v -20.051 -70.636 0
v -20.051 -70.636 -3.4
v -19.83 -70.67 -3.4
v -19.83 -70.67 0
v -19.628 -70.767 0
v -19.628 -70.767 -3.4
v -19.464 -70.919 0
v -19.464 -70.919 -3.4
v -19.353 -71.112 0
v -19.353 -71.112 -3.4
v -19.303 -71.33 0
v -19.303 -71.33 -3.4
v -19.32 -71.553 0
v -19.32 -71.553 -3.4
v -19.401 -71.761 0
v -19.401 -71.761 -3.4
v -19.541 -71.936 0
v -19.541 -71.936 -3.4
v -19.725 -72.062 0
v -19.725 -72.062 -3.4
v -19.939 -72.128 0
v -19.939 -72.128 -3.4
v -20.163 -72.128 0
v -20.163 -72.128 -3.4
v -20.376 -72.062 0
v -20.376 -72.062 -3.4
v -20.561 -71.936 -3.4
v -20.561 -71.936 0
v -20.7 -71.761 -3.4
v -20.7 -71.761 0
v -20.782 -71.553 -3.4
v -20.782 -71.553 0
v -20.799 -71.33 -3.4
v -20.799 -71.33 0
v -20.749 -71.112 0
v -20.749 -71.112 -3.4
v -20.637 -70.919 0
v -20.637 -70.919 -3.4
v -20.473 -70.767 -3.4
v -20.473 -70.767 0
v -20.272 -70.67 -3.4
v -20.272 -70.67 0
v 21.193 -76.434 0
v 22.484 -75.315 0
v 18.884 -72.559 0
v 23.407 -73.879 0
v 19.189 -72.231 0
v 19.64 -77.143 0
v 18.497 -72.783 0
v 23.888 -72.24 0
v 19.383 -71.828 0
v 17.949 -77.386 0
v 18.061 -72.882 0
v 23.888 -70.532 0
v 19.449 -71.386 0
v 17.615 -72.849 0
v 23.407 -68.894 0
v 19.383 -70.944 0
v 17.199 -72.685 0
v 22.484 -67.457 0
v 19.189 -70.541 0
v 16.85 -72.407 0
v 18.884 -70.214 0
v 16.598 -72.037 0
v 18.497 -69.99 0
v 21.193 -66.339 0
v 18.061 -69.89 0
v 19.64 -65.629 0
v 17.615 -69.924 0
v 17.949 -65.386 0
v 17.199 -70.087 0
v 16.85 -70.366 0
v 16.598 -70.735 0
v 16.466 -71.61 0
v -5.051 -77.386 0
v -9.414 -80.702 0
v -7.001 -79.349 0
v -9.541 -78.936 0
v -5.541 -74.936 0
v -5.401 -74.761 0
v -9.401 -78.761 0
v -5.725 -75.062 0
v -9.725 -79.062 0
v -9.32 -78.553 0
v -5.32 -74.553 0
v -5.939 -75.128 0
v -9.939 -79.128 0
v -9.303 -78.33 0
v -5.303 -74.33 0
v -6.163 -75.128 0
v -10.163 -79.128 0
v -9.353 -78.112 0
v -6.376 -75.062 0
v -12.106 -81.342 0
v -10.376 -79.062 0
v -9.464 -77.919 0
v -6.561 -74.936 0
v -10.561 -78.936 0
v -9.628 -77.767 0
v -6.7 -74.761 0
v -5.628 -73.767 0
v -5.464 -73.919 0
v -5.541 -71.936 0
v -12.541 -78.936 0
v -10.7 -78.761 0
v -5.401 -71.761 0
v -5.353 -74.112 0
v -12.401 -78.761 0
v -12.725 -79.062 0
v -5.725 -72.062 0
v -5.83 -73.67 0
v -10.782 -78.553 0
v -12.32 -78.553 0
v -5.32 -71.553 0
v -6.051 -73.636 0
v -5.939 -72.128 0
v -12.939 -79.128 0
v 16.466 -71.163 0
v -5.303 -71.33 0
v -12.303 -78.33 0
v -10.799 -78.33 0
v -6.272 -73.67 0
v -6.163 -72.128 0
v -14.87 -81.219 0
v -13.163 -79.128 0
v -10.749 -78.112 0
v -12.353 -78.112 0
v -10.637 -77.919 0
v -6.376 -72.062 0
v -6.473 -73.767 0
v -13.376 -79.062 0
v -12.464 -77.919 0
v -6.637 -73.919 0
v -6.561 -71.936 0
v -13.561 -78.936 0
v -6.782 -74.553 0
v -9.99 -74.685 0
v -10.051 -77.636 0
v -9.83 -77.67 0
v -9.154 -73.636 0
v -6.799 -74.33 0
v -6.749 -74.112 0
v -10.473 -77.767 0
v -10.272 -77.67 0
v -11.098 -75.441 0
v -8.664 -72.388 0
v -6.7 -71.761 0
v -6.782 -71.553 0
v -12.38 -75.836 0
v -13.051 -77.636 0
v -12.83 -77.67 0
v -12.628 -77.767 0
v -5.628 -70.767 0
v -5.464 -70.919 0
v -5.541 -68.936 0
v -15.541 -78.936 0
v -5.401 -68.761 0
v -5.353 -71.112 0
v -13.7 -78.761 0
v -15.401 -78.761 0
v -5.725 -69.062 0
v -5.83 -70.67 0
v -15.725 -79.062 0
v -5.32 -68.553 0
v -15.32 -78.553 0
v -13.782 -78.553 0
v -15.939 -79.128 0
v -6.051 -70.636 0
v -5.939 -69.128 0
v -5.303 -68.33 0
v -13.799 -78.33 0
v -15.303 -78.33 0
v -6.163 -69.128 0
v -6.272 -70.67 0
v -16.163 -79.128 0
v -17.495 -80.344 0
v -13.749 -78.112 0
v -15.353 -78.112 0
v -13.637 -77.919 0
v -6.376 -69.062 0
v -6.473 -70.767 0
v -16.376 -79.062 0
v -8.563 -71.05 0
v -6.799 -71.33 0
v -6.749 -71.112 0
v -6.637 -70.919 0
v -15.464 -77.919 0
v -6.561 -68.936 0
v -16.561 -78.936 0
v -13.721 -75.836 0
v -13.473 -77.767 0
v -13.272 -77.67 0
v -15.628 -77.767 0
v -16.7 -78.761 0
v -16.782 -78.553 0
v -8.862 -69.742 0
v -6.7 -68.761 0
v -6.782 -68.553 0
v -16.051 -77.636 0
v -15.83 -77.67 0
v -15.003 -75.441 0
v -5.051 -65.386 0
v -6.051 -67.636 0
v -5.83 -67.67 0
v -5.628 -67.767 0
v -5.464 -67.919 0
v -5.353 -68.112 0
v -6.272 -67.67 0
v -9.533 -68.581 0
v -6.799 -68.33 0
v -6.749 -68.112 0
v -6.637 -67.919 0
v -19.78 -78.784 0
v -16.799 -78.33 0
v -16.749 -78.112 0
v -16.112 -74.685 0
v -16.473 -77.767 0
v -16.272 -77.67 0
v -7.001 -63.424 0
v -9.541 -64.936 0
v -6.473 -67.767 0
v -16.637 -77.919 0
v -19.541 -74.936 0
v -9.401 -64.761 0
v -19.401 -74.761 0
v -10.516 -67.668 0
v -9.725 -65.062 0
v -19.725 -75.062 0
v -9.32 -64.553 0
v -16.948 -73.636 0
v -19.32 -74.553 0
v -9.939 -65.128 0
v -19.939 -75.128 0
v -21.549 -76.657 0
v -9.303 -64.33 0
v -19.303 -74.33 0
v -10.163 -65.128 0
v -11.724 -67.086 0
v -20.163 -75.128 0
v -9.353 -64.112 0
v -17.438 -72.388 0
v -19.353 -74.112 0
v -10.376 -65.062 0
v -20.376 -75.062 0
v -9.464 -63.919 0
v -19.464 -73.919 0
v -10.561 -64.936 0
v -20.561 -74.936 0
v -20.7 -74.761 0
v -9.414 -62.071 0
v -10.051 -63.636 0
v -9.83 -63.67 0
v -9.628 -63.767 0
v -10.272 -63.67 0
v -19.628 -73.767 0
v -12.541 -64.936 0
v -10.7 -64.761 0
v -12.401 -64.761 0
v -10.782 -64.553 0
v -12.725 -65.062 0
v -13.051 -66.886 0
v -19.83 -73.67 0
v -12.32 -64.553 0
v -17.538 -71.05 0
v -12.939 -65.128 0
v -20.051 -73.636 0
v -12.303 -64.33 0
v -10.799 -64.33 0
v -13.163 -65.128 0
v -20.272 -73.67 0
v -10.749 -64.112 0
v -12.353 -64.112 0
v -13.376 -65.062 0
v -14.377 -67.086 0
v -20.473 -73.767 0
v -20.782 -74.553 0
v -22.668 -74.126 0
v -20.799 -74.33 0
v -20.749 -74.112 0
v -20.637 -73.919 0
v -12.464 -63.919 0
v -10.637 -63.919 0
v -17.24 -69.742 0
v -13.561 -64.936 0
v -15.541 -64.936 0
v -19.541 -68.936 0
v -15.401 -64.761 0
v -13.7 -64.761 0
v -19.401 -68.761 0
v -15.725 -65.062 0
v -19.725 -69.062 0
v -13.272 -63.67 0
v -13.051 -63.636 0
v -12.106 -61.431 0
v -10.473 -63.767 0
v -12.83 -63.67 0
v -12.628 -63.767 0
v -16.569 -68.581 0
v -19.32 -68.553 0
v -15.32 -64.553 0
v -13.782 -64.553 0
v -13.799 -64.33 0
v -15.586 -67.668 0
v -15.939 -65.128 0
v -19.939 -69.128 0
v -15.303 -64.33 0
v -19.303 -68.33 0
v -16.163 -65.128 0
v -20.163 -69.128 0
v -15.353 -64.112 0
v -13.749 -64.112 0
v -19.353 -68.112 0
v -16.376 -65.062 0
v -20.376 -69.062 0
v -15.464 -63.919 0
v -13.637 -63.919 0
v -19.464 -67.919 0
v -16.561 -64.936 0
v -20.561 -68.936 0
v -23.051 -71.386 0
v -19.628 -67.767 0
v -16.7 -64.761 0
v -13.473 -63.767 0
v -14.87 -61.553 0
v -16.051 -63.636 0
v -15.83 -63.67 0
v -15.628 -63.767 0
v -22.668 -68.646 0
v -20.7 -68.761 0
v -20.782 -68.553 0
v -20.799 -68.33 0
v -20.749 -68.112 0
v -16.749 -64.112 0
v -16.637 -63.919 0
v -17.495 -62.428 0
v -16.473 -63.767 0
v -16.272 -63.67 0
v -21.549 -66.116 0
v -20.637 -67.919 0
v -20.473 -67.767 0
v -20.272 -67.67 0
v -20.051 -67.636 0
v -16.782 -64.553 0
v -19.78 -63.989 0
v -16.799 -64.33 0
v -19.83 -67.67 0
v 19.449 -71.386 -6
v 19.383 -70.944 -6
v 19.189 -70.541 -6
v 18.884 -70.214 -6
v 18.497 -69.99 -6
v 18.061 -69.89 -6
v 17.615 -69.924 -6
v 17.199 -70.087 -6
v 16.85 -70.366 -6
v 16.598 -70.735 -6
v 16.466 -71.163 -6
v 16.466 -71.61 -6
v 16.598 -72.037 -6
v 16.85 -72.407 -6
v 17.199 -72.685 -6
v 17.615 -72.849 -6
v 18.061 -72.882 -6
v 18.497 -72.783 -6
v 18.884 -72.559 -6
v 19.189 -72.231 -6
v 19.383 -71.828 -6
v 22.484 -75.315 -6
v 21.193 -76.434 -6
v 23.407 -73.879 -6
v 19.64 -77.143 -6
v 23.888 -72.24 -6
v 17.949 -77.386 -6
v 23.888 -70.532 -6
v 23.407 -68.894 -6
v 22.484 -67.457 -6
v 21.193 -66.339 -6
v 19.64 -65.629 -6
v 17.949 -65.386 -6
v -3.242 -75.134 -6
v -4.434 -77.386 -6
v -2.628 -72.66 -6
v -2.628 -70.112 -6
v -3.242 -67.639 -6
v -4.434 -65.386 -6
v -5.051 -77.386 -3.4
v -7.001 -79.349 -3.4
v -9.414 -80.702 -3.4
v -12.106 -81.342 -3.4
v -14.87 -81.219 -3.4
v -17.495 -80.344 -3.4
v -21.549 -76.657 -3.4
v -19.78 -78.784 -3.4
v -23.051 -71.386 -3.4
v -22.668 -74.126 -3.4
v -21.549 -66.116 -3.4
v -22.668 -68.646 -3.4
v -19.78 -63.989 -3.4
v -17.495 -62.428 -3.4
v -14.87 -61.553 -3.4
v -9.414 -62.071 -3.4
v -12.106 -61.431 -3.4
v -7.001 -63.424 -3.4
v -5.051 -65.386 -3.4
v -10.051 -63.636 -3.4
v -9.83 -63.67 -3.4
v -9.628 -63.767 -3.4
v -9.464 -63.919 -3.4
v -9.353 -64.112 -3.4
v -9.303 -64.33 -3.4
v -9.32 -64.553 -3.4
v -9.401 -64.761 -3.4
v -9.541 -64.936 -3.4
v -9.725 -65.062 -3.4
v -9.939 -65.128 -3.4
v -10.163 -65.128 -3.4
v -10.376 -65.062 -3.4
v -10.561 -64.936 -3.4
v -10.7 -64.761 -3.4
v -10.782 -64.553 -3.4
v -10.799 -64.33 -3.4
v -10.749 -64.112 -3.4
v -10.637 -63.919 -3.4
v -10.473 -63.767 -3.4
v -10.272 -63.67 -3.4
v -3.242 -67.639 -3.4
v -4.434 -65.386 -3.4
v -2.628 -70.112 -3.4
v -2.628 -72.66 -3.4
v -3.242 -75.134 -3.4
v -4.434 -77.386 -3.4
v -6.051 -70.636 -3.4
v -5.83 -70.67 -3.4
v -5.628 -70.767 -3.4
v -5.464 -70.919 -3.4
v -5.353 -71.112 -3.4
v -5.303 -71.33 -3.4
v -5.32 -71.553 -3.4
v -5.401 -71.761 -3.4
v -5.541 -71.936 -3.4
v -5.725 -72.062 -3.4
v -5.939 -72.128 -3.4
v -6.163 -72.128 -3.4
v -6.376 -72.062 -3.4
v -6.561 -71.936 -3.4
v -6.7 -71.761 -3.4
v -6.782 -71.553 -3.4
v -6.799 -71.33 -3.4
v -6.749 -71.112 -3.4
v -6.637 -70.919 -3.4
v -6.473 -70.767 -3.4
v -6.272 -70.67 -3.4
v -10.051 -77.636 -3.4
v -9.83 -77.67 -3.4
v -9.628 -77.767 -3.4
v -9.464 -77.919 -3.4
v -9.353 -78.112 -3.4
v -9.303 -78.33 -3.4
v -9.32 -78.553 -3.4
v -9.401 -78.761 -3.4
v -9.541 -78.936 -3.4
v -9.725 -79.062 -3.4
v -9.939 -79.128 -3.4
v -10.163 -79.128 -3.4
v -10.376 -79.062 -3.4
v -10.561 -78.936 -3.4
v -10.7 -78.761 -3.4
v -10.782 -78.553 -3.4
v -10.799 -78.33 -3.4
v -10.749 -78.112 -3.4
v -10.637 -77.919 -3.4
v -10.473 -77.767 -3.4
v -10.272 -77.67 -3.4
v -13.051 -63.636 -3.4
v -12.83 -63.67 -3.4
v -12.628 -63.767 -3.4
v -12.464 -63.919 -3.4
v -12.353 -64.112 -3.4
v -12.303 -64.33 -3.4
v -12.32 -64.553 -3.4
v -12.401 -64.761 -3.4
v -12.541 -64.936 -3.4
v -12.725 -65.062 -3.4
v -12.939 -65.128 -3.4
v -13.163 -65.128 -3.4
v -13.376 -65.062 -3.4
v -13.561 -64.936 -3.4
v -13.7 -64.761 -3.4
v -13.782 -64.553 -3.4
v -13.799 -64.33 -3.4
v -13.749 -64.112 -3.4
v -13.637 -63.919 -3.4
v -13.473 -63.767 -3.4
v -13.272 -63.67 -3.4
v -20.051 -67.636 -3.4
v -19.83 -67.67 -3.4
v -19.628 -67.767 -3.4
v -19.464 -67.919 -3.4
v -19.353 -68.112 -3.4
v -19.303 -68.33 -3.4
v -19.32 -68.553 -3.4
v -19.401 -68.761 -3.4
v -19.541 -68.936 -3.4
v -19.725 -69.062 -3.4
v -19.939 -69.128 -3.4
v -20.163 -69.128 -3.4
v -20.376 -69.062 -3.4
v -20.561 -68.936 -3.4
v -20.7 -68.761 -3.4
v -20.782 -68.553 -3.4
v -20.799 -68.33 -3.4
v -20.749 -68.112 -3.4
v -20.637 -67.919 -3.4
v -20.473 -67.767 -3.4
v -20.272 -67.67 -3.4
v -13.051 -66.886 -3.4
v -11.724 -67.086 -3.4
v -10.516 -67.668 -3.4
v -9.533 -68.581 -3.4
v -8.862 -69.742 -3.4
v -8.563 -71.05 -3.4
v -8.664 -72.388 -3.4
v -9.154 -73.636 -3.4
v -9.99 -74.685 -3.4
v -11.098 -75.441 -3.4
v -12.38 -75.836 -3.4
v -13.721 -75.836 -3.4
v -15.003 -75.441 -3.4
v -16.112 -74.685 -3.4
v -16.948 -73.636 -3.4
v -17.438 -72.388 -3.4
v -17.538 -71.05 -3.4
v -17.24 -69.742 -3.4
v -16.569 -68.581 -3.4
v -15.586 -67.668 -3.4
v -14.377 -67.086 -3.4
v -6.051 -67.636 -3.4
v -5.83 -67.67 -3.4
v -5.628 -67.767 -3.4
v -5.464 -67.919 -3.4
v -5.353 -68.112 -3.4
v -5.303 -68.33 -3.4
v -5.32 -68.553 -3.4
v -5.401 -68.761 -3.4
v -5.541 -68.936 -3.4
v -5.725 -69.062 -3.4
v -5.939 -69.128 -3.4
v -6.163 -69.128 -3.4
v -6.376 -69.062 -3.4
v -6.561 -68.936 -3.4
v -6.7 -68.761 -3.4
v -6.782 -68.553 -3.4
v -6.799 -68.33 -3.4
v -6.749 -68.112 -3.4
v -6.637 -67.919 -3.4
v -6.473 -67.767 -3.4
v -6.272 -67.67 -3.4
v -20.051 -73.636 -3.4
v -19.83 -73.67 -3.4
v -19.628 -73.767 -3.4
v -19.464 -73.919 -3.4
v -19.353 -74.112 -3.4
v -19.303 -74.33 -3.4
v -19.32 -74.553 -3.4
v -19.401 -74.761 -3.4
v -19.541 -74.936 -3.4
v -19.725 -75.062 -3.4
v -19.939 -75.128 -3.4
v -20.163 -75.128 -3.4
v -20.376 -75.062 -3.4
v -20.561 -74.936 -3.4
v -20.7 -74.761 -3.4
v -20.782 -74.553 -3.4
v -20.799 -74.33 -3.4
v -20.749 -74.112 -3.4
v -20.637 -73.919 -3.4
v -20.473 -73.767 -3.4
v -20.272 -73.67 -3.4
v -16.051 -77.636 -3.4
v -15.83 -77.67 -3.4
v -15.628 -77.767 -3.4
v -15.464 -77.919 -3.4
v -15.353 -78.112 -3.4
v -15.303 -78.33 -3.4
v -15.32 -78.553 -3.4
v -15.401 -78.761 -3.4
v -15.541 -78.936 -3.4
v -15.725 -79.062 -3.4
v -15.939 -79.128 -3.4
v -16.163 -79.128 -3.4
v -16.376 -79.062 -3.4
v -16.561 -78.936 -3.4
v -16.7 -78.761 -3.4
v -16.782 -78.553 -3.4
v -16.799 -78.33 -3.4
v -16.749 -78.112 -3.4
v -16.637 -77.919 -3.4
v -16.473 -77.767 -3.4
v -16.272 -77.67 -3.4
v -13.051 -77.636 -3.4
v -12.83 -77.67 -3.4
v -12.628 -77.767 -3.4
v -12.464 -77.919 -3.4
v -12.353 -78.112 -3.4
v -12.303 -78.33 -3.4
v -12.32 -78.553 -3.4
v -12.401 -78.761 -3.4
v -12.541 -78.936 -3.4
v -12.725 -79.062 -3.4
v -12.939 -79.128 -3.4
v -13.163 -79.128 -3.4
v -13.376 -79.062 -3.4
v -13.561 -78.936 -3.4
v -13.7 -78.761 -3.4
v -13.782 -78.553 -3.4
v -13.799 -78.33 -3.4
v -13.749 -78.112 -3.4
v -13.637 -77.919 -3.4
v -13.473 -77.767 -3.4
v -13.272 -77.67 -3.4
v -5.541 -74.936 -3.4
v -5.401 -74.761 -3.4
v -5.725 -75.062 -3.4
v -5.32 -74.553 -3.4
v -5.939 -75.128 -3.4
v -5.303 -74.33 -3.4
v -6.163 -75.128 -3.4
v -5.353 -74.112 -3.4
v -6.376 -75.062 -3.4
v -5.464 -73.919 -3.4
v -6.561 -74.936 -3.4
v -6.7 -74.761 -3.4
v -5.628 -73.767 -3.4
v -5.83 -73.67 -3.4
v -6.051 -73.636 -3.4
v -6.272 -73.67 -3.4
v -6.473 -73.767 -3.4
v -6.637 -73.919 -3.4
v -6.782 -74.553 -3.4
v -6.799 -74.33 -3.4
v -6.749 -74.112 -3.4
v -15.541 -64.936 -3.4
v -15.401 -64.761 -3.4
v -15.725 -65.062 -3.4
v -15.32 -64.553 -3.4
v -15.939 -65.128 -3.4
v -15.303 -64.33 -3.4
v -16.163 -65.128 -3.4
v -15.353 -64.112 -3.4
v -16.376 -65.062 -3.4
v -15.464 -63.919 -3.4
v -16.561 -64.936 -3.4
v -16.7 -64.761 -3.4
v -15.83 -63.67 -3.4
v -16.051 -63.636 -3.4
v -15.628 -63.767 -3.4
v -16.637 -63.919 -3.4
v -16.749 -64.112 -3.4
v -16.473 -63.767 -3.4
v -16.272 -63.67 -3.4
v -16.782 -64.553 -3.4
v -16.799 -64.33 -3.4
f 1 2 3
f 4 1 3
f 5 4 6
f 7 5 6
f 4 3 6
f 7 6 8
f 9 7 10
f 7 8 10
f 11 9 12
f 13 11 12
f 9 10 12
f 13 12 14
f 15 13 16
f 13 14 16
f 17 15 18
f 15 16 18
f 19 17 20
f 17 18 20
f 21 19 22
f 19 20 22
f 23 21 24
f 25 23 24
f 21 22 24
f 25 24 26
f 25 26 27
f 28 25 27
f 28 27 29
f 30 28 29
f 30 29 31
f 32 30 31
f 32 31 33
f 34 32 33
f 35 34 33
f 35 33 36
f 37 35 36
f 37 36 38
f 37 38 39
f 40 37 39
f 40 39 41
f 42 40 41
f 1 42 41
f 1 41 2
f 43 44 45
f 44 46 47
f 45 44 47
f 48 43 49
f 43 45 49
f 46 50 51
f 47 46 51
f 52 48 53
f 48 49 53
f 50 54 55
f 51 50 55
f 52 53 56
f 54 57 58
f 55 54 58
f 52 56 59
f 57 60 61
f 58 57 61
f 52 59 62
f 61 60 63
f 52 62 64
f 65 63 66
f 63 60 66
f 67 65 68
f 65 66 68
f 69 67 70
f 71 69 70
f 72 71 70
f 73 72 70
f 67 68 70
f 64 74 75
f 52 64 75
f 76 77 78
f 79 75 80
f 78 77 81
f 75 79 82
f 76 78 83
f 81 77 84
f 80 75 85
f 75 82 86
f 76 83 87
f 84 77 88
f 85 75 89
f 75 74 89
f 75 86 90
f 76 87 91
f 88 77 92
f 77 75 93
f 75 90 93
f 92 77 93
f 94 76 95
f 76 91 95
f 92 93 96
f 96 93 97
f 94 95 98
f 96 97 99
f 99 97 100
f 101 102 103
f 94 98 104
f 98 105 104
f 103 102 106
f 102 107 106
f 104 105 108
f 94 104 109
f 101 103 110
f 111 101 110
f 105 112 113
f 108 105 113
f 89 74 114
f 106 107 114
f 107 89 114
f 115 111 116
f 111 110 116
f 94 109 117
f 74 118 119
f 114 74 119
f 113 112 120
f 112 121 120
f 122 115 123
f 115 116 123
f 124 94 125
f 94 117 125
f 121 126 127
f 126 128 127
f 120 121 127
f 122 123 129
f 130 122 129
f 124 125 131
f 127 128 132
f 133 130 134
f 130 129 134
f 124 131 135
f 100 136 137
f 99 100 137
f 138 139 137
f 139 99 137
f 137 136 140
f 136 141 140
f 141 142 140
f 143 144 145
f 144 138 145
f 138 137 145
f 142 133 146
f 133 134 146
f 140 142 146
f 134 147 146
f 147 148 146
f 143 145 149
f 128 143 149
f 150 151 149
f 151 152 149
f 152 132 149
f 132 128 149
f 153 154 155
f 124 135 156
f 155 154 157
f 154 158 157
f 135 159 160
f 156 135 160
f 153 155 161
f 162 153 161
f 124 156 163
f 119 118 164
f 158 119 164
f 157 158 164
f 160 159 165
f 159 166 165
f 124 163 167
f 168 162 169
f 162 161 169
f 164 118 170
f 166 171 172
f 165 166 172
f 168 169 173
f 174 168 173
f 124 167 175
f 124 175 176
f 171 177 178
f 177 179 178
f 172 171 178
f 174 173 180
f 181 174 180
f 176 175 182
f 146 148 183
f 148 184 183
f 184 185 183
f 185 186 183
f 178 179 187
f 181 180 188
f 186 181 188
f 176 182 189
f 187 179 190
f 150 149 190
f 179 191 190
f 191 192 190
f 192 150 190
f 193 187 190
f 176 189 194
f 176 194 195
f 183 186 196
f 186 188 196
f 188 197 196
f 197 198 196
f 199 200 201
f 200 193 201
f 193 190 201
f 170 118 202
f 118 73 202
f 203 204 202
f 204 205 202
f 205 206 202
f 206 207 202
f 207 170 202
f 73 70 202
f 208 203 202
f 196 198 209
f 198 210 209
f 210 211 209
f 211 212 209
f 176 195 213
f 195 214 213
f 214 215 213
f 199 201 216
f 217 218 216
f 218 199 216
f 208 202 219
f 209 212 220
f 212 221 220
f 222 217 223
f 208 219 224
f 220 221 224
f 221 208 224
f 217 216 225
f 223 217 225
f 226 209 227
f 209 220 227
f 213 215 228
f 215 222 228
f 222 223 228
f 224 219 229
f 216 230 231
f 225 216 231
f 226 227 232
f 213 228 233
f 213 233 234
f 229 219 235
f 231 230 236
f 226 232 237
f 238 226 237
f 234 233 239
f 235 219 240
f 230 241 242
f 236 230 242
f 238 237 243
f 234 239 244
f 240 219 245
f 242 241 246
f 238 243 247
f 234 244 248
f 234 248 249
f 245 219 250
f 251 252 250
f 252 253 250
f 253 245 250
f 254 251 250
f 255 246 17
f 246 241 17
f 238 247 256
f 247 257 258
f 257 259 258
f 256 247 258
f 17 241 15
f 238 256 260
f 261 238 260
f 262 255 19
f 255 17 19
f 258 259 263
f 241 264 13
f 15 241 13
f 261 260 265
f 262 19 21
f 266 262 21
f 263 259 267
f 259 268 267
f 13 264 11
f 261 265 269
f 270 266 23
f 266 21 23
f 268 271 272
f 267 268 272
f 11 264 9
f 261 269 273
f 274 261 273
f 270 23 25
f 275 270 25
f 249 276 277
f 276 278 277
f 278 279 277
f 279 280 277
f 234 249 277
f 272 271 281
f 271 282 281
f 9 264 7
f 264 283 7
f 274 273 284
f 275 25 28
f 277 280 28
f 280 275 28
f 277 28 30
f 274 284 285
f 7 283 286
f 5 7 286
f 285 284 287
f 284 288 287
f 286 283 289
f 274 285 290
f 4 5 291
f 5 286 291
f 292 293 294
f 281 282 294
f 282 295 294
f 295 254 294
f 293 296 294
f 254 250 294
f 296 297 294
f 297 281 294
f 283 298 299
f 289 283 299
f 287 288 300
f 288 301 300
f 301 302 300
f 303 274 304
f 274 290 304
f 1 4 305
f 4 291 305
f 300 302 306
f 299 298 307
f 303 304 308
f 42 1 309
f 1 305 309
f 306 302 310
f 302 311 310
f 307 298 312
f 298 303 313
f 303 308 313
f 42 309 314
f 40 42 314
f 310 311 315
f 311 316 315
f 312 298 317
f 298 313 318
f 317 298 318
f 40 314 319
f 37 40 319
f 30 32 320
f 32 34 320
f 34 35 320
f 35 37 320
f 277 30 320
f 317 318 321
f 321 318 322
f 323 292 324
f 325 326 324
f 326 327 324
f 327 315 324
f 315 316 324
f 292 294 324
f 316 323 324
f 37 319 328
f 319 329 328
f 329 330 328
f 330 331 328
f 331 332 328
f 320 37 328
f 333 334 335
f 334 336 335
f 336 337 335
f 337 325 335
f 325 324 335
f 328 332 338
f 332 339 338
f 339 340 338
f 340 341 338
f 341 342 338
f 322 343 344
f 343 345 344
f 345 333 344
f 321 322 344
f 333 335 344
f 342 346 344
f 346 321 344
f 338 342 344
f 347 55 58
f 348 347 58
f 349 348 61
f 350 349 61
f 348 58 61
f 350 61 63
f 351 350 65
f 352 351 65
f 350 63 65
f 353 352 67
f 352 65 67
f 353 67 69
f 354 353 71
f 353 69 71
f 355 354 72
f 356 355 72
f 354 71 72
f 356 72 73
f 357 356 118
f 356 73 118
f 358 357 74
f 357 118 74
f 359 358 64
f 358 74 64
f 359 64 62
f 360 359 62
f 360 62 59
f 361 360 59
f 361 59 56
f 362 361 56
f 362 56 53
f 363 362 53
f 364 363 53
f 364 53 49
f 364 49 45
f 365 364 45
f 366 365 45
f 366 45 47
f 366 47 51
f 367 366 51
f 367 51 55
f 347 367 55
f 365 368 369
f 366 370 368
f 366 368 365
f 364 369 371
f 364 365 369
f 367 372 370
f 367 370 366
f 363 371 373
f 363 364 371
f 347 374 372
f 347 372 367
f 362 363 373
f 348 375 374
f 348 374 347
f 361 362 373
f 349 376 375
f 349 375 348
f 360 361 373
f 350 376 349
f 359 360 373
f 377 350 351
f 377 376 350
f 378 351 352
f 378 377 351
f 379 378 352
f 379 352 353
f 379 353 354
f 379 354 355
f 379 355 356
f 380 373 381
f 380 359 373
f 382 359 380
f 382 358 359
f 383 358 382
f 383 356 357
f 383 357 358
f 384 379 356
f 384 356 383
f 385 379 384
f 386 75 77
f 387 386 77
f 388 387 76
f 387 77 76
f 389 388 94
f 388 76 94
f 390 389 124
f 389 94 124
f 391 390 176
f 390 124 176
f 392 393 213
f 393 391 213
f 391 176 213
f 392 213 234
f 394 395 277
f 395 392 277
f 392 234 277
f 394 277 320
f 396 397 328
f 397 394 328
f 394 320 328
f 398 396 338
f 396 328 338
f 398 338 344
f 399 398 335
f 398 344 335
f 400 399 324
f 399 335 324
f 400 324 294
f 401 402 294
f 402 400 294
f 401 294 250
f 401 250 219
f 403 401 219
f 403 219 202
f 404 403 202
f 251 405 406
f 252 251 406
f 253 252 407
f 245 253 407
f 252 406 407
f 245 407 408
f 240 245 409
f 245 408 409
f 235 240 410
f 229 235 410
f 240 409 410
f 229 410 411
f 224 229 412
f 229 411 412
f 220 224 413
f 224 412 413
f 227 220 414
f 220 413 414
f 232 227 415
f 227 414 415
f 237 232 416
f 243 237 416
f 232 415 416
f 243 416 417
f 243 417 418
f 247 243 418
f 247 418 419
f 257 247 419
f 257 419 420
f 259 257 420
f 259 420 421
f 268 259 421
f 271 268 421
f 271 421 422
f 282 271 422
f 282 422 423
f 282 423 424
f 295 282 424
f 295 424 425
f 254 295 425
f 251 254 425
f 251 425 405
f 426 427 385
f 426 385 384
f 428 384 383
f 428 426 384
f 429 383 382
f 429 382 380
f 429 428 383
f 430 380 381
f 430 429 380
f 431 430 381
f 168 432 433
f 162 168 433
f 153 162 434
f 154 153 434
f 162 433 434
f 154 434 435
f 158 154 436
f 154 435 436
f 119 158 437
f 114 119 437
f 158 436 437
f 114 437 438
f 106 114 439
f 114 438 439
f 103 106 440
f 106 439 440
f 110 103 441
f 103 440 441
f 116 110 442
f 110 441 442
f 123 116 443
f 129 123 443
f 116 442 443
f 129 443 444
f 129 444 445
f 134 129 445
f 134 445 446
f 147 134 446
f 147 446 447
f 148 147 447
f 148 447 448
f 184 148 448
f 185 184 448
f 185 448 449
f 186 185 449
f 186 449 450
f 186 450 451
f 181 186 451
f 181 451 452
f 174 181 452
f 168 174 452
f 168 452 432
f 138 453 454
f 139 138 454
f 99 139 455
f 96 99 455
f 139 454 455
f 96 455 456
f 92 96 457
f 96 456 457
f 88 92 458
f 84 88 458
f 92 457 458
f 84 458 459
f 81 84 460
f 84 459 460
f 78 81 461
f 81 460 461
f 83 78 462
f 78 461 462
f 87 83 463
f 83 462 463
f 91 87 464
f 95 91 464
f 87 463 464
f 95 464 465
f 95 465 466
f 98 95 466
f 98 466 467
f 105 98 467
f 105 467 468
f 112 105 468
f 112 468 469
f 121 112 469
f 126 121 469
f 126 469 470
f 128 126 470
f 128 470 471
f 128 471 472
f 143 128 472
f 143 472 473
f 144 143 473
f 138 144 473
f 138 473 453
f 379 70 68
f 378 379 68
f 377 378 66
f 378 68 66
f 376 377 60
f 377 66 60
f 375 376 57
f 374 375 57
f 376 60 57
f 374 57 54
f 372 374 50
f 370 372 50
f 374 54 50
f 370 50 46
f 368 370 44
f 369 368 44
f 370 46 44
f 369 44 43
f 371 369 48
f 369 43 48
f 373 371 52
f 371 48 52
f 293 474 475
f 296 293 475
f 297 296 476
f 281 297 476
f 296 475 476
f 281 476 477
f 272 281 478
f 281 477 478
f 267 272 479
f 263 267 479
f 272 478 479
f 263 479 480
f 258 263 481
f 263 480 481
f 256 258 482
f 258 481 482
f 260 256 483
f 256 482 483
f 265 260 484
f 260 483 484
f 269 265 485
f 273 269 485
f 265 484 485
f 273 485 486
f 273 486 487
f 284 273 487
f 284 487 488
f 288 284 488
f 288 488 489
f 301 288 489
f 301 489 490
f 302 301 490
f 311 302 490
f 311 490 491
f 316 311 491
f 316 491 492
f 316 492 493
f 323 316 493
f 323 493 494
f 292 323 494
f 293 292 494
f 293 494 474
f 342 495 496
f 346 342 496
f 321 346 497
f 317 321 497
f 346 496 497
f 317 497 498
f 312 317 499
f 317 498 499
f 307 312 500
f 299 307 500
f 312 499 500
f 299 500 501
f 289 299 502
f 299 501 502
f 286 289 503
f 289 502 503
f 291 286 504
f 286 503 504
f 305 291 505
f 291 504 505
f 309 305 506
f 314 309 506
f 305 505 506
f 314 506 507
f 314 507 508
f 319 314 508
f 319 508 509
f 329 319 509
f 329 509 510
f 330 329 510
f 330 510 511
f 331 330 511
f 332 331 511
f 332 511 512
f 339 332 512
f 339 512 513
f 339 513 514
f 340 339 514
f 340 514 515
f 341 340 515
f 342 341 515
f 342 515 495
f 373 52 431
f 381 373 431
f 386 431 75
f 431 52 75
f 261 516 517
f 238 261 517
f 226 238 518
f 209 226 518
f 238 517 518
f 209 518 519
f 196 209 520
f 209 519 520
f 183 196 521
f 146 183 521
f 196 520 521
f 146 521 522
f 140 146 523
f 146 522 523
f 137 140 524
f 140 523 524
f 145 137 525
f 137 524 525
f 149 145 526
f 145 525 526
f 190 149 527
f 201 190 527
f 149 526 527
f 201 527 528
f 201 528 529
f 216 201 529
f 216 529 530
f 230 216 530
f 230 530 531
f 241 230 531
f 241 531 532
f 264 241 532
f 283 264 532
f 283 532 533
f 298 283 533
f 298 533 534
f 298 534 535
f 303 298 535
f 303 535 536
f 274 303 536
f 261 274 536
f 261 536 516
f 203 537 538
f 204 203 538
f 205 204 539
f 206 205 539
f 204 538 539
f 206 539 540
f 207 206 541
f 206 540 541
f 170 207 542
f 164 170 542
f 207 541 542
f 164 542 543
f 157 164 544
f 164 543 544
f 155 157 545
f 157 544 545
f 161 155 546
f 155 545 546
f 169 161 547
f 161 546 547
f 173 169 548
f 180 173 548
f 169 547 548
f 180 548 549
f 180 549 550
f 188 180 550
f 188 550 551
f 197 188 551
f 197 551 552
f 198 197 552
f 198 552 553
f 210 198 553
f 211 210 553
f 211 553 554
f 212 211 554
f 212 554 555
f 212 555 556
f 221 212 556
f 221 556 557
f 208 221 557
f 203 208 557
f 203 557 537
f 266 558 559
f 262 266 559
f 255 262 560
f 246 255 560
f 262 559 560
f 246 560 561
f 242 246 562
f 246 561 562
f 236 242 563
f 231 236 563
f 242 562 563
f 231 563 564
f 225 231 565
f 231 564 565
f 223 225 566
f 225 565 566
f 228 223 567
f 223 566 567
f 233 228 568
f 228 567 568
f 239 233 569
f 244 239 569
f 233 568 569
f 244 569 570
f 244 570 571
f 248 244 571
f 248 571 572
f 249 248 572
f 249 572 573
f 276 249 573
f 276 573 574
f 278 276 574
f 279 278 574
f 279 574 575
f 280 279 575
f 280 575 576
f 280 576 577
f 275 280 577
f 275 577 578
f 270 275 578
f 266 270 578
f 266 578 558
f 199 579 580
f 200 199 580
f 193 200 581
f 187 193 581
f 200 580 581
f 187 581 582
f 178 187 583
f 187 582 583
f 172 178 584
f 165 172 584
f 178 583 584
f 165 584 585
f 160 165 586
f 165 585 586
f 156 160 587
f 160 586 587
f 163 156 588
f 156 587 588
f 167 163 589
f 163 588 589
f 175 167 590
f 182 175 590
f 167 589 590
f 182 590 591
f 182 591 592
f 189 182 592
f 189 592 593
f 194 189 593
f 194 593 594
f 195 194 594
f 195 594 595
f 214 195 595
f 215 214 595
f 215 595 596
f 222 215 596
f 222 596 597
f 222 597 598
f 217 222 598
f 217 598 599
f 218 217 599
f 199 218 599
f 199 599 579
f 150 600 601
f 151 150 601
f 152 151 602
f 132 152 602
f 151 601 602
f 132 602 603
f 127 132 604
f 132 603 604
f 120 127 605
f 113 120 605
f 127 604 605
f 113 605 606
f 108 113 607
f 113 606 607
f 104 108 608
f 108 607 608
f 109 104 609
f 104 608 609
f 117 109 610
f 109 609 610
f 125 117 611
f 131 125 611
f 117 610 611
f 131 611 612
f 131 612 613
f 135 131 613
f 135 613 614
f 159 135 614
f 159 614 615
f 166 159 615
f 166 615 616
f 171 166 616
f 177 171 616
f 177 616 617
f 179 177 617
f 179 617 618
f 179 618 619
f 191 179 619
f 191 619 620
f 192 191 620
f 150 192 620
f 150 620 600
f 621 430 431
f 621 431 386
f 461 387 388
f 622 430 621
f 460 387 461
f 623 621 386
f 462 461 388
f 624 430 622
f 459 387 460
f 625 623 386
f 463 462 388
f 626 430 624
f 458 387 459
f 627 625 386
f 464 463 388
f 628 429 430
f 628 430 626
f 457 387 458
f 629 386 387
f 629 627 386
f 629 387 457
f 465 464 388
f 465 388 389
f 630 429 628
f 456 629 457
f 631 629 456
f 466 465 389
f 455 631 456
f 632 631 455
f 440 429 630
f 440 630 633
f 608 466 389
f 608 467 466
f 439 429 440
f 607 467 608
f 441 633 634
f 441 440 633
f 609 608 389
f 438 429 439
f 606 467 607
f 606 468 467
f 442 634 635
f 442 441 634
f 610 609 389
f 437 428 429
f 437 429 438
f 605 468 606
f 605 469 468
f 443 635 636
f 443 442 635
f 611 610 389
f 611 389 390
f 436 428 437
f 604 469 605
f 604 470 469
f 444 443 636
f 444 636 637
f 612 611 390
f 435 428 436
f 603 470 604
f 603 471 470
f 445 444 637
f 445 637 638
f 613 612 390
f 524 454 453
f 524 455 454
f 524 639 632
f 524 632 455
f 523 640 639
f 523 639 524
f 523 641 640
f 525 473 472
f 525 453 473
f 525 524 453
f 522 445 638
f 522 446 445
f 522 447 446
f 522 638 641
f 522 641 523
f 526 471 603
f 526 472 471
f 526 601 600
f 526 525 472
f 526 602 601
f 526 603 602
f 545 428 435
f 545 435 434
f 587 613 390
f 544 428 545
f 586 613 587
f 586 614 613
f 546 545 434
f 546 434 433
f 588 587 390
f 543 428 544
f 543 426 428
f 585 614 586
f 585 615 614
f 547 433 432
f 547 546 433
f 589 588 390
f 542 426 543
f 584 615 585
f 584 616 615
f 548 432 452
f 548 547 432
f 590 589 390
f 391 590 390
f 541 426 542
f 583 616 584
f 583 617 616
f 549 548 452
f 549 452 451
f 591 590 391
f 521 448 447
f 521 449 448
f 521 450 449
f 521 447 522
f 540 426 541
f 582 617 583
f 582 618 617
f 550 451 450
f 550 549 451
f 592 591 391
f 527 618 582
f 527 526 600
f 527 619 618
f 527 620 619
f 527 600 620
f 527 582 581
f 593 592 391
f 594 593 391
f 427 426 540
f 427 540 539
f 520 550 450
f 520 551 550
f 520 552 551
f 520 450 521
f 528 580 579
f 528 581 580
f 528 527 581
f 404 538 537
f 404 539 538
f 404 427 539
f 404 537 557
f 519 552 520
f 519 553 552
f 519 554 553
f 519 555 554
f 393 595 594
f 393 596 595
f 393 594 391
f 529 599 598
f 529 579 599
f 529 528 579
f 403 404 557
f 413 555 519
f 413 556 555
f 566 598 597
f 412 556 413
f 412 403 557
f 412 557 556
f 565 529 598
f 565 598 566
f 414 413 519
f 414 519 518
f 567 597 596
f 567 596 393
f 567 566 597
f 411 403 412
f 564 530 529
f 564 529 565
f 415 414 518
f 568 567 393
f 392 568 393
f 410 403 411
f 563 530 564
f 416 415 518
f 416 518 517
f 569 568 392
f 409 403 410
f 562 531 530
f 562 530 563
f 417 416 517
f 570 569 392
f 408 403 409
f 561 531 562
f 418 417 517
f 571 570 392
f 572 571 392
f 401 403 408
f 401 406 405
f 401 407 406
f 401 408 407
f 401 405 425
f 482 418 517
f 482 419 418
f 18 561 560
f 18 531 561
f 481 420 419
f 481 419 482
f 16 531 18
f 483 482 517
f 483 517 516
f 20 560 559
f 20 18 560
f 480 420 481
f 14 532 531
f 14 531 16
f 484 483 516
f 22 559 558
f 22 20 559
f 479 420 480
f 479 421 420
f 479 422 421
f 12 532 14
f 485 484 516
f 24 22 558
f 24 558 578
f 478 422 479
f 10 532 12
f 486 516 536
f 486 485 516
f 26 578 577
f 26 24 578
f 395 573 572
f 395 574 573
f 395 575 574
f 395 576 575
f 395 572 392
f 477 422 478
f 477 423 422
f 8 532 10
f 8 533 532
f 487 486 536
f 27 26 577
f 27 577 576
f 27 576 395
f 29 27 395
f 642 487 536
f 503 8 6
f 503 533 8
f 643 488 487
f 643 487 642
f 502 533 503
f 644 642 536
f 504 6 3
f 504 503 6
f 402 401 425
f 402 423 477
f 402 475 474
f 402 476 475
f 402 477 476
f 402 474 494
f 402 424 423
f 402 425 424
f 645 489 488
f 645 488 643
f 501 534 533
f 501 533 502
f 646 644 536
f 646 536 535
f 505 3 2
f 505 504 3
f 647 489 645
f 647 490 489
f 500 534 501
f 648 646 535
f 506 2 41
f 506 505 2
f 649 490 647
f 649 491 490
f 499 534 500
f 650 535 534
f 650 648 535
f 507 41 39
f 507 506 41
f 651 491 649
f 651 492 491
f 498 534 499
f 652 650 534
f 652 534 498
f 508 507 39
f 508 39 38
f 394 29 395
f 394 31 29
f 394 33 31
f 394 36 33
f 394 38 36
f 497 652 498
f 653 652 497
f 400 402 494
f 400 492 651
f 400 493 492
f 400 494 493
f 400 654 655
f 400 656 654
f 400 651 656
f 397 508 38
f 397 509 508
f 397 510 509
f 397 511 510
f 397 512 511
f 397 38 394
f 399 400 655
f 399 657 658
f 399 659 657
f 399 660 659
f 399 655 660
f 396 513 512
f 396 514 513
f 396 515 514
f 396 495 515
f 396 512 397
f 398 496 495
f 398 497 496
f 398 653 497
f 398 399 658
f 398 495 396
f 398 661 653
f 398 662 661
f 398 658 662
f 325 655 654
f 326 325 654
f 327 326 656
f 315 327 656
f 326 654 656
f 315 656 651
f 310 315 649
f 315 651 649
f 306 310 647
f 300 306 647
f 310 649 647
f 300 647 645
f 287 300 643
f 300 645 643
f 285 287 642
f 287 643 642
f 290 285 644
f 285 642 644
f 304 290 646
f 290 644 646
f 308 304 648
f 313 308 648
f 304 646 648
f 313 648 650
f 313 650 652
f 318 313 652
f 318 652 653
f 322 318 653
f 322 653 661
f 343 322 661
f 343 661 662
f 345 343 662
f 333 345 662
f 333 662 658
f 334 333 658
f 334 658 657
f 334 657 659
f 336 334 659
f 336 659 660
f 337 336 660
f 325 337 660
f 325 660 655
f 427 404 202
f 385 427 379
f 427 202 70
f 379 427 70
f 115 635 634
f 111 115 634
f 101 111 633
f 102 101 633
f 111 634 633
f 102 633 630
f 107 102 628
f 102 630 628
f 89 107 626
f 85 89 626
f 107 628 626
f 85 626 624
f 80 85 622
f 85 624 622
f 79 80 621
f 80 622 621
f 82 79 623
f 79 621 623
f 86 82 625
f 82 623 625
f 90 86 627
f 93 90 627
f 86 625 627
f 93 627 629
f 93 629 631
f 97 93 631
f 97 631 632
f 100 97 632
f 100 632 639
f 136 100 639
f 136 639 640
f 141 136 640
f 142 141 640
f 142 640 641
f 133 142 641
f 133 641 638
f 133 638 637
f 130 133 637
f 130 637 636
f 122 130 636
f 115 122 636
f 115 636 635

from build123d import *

# Parameters (mm, degrees)
EXTRUDE_1_DEPTH     = 6
SKETCH_7_R          = 1.5
CUT_EXTRUDE_3_DEPTH = 31
CUT_EXTRUDE_START   = -2.6
SKETCH_8_R          = 10.5
CUT_EXTRUDE_4_DEPTH = 2.6
SKETCH_9_R          = 0.75
CUT_EXTRUDE_5_DEPTH = 10
SKETCH_10_R         = 4.5
CUT_EXTRUDE_6_DEPTH = 10


with BuildPart() as part:
    # 草图2 → 凸台-拉伸1 (new body)
    with BuildSketch(Plane.XY):
        with BuildLine():
            Line((-5.050750258, -65.386258364), (17.949249742, -65.386258364))
            ThreePointArc((17.949249742, -65.386258364), (23.949249742, -71.386258364), (17.949249742, -77.386258364))
            Line((17.949249742, -77.386258364), (-5.050750258, -77.386258364))
            ThreePointArc((-5.050750258, -77.386258364), (-23.050750258, -71.386258364), (-5.050750258, -65.386258364))
        make_face()
    extrude(amount=-EXTRUDE_1_DEPTH)

    # 草图7 → 切除-拉伸3 (cut)
    with BuildSketch(Plane.XY):
        with Locations((17.949249742, -71.386258364)):
            Circle(SKETCH_7_R)
    extrude(amount=-CUT_EXTRUDE_3_DEPTH, mode=Mode.SUBTRACT)

    # 草图8 → 切除-拉伸4 (cut)
    with BuildSketch(Plane(origin=(0, 0, -6), x_dir=(-1, 0, 0), z_dir=(0, 0, -1)).offset(CUT_EXTRUDE_START)):
        with Locations((13.050750258, -71.386258364)):
            Circle(SKETCH_8_R)
    extrude(amount=CUT_EXTRUDE_4_DEPTH, mode=Mode.SUBTRACT)

    # 草图9 → 切除-拉伸5 (cut)
    with BuildSketch(Plane(origin=(0, 0, -3.4), x_dir=(-1, 0, 0), z_dir=(0, 0, -1))):
        with Locations(Location((6.050750258, -71.386258364, 0), (0, 0, 90))):
            Circle(SKETCH_9_R)
        with Locations(Location((6.050750258, -74.386258364, 0), (0, 0, 90))):
            Circle(SKETCH_9_R)
        with Locations(Location((6.050750258, -68.386258364, 0), (0, 0, 90))):
            Circle(SKETCH_9_R)
        with Locations(Location((10.050750258, -78.386258364, 0), (0, 0, 90))):
            Circle(SKETCH_9_R)
        with Locations(Location((13.050750258, -78.386258364, 0), (0, 0, 90))):
            Circle(SKETCH_9_R)
        with Locations(Location((16.050750258, -78.386258364, 0), (0, 0, 90))):
            Circle(SKETCH_9_R)
        with Locations(Location((20.050750258, -74.386258364, 0), (0, 0, 90))):
            Circle(SKETCH_9_R)
        with Locations(Location((20.050750258, -71.386258364, 0), (0, 0, 90))):
            Circle(SKETCH_9_R)
        with Locations(Location((20.050750258, -68.386258364, 0), (0, 0, 90))):
            Circle(SKETCH_9_R)
        with Locations(Location((16.050750258, -64.386258364, 0), (0, 0, 90))):
            Circle(SKETCH_9_R)
        with Locations(Location((13.050750258, -64.386258364, 0), (0, 0, 90))):
            Circle(SKETCH_9_R)
        with Locations(Location((10.050750258, -64.386258364, 0), (0, 0, 90))):
            Circle(SKETCH_9_R)
    extrude(amount=-CUT_EXTRUDE_5_DEPTH, mode=Mode.SUBTRACT)

    # 草图10 → 切除-拉伸6 (cut)
    with BuildSketch(Plane(origin=(0, 0, -3.4), x_dir=(-1, 0, 0), z_dir=(0, 0, -1))):
        with Locations(Location((13.050750258, -71.386258364, 0), (0, 0, 90))):
            Circle(SKETCH_10_R)
    extrude(amount=-CUT_EXTRUDE_6_DEPTH, mode=Mode.SUBTRACT)


solid = part.part
